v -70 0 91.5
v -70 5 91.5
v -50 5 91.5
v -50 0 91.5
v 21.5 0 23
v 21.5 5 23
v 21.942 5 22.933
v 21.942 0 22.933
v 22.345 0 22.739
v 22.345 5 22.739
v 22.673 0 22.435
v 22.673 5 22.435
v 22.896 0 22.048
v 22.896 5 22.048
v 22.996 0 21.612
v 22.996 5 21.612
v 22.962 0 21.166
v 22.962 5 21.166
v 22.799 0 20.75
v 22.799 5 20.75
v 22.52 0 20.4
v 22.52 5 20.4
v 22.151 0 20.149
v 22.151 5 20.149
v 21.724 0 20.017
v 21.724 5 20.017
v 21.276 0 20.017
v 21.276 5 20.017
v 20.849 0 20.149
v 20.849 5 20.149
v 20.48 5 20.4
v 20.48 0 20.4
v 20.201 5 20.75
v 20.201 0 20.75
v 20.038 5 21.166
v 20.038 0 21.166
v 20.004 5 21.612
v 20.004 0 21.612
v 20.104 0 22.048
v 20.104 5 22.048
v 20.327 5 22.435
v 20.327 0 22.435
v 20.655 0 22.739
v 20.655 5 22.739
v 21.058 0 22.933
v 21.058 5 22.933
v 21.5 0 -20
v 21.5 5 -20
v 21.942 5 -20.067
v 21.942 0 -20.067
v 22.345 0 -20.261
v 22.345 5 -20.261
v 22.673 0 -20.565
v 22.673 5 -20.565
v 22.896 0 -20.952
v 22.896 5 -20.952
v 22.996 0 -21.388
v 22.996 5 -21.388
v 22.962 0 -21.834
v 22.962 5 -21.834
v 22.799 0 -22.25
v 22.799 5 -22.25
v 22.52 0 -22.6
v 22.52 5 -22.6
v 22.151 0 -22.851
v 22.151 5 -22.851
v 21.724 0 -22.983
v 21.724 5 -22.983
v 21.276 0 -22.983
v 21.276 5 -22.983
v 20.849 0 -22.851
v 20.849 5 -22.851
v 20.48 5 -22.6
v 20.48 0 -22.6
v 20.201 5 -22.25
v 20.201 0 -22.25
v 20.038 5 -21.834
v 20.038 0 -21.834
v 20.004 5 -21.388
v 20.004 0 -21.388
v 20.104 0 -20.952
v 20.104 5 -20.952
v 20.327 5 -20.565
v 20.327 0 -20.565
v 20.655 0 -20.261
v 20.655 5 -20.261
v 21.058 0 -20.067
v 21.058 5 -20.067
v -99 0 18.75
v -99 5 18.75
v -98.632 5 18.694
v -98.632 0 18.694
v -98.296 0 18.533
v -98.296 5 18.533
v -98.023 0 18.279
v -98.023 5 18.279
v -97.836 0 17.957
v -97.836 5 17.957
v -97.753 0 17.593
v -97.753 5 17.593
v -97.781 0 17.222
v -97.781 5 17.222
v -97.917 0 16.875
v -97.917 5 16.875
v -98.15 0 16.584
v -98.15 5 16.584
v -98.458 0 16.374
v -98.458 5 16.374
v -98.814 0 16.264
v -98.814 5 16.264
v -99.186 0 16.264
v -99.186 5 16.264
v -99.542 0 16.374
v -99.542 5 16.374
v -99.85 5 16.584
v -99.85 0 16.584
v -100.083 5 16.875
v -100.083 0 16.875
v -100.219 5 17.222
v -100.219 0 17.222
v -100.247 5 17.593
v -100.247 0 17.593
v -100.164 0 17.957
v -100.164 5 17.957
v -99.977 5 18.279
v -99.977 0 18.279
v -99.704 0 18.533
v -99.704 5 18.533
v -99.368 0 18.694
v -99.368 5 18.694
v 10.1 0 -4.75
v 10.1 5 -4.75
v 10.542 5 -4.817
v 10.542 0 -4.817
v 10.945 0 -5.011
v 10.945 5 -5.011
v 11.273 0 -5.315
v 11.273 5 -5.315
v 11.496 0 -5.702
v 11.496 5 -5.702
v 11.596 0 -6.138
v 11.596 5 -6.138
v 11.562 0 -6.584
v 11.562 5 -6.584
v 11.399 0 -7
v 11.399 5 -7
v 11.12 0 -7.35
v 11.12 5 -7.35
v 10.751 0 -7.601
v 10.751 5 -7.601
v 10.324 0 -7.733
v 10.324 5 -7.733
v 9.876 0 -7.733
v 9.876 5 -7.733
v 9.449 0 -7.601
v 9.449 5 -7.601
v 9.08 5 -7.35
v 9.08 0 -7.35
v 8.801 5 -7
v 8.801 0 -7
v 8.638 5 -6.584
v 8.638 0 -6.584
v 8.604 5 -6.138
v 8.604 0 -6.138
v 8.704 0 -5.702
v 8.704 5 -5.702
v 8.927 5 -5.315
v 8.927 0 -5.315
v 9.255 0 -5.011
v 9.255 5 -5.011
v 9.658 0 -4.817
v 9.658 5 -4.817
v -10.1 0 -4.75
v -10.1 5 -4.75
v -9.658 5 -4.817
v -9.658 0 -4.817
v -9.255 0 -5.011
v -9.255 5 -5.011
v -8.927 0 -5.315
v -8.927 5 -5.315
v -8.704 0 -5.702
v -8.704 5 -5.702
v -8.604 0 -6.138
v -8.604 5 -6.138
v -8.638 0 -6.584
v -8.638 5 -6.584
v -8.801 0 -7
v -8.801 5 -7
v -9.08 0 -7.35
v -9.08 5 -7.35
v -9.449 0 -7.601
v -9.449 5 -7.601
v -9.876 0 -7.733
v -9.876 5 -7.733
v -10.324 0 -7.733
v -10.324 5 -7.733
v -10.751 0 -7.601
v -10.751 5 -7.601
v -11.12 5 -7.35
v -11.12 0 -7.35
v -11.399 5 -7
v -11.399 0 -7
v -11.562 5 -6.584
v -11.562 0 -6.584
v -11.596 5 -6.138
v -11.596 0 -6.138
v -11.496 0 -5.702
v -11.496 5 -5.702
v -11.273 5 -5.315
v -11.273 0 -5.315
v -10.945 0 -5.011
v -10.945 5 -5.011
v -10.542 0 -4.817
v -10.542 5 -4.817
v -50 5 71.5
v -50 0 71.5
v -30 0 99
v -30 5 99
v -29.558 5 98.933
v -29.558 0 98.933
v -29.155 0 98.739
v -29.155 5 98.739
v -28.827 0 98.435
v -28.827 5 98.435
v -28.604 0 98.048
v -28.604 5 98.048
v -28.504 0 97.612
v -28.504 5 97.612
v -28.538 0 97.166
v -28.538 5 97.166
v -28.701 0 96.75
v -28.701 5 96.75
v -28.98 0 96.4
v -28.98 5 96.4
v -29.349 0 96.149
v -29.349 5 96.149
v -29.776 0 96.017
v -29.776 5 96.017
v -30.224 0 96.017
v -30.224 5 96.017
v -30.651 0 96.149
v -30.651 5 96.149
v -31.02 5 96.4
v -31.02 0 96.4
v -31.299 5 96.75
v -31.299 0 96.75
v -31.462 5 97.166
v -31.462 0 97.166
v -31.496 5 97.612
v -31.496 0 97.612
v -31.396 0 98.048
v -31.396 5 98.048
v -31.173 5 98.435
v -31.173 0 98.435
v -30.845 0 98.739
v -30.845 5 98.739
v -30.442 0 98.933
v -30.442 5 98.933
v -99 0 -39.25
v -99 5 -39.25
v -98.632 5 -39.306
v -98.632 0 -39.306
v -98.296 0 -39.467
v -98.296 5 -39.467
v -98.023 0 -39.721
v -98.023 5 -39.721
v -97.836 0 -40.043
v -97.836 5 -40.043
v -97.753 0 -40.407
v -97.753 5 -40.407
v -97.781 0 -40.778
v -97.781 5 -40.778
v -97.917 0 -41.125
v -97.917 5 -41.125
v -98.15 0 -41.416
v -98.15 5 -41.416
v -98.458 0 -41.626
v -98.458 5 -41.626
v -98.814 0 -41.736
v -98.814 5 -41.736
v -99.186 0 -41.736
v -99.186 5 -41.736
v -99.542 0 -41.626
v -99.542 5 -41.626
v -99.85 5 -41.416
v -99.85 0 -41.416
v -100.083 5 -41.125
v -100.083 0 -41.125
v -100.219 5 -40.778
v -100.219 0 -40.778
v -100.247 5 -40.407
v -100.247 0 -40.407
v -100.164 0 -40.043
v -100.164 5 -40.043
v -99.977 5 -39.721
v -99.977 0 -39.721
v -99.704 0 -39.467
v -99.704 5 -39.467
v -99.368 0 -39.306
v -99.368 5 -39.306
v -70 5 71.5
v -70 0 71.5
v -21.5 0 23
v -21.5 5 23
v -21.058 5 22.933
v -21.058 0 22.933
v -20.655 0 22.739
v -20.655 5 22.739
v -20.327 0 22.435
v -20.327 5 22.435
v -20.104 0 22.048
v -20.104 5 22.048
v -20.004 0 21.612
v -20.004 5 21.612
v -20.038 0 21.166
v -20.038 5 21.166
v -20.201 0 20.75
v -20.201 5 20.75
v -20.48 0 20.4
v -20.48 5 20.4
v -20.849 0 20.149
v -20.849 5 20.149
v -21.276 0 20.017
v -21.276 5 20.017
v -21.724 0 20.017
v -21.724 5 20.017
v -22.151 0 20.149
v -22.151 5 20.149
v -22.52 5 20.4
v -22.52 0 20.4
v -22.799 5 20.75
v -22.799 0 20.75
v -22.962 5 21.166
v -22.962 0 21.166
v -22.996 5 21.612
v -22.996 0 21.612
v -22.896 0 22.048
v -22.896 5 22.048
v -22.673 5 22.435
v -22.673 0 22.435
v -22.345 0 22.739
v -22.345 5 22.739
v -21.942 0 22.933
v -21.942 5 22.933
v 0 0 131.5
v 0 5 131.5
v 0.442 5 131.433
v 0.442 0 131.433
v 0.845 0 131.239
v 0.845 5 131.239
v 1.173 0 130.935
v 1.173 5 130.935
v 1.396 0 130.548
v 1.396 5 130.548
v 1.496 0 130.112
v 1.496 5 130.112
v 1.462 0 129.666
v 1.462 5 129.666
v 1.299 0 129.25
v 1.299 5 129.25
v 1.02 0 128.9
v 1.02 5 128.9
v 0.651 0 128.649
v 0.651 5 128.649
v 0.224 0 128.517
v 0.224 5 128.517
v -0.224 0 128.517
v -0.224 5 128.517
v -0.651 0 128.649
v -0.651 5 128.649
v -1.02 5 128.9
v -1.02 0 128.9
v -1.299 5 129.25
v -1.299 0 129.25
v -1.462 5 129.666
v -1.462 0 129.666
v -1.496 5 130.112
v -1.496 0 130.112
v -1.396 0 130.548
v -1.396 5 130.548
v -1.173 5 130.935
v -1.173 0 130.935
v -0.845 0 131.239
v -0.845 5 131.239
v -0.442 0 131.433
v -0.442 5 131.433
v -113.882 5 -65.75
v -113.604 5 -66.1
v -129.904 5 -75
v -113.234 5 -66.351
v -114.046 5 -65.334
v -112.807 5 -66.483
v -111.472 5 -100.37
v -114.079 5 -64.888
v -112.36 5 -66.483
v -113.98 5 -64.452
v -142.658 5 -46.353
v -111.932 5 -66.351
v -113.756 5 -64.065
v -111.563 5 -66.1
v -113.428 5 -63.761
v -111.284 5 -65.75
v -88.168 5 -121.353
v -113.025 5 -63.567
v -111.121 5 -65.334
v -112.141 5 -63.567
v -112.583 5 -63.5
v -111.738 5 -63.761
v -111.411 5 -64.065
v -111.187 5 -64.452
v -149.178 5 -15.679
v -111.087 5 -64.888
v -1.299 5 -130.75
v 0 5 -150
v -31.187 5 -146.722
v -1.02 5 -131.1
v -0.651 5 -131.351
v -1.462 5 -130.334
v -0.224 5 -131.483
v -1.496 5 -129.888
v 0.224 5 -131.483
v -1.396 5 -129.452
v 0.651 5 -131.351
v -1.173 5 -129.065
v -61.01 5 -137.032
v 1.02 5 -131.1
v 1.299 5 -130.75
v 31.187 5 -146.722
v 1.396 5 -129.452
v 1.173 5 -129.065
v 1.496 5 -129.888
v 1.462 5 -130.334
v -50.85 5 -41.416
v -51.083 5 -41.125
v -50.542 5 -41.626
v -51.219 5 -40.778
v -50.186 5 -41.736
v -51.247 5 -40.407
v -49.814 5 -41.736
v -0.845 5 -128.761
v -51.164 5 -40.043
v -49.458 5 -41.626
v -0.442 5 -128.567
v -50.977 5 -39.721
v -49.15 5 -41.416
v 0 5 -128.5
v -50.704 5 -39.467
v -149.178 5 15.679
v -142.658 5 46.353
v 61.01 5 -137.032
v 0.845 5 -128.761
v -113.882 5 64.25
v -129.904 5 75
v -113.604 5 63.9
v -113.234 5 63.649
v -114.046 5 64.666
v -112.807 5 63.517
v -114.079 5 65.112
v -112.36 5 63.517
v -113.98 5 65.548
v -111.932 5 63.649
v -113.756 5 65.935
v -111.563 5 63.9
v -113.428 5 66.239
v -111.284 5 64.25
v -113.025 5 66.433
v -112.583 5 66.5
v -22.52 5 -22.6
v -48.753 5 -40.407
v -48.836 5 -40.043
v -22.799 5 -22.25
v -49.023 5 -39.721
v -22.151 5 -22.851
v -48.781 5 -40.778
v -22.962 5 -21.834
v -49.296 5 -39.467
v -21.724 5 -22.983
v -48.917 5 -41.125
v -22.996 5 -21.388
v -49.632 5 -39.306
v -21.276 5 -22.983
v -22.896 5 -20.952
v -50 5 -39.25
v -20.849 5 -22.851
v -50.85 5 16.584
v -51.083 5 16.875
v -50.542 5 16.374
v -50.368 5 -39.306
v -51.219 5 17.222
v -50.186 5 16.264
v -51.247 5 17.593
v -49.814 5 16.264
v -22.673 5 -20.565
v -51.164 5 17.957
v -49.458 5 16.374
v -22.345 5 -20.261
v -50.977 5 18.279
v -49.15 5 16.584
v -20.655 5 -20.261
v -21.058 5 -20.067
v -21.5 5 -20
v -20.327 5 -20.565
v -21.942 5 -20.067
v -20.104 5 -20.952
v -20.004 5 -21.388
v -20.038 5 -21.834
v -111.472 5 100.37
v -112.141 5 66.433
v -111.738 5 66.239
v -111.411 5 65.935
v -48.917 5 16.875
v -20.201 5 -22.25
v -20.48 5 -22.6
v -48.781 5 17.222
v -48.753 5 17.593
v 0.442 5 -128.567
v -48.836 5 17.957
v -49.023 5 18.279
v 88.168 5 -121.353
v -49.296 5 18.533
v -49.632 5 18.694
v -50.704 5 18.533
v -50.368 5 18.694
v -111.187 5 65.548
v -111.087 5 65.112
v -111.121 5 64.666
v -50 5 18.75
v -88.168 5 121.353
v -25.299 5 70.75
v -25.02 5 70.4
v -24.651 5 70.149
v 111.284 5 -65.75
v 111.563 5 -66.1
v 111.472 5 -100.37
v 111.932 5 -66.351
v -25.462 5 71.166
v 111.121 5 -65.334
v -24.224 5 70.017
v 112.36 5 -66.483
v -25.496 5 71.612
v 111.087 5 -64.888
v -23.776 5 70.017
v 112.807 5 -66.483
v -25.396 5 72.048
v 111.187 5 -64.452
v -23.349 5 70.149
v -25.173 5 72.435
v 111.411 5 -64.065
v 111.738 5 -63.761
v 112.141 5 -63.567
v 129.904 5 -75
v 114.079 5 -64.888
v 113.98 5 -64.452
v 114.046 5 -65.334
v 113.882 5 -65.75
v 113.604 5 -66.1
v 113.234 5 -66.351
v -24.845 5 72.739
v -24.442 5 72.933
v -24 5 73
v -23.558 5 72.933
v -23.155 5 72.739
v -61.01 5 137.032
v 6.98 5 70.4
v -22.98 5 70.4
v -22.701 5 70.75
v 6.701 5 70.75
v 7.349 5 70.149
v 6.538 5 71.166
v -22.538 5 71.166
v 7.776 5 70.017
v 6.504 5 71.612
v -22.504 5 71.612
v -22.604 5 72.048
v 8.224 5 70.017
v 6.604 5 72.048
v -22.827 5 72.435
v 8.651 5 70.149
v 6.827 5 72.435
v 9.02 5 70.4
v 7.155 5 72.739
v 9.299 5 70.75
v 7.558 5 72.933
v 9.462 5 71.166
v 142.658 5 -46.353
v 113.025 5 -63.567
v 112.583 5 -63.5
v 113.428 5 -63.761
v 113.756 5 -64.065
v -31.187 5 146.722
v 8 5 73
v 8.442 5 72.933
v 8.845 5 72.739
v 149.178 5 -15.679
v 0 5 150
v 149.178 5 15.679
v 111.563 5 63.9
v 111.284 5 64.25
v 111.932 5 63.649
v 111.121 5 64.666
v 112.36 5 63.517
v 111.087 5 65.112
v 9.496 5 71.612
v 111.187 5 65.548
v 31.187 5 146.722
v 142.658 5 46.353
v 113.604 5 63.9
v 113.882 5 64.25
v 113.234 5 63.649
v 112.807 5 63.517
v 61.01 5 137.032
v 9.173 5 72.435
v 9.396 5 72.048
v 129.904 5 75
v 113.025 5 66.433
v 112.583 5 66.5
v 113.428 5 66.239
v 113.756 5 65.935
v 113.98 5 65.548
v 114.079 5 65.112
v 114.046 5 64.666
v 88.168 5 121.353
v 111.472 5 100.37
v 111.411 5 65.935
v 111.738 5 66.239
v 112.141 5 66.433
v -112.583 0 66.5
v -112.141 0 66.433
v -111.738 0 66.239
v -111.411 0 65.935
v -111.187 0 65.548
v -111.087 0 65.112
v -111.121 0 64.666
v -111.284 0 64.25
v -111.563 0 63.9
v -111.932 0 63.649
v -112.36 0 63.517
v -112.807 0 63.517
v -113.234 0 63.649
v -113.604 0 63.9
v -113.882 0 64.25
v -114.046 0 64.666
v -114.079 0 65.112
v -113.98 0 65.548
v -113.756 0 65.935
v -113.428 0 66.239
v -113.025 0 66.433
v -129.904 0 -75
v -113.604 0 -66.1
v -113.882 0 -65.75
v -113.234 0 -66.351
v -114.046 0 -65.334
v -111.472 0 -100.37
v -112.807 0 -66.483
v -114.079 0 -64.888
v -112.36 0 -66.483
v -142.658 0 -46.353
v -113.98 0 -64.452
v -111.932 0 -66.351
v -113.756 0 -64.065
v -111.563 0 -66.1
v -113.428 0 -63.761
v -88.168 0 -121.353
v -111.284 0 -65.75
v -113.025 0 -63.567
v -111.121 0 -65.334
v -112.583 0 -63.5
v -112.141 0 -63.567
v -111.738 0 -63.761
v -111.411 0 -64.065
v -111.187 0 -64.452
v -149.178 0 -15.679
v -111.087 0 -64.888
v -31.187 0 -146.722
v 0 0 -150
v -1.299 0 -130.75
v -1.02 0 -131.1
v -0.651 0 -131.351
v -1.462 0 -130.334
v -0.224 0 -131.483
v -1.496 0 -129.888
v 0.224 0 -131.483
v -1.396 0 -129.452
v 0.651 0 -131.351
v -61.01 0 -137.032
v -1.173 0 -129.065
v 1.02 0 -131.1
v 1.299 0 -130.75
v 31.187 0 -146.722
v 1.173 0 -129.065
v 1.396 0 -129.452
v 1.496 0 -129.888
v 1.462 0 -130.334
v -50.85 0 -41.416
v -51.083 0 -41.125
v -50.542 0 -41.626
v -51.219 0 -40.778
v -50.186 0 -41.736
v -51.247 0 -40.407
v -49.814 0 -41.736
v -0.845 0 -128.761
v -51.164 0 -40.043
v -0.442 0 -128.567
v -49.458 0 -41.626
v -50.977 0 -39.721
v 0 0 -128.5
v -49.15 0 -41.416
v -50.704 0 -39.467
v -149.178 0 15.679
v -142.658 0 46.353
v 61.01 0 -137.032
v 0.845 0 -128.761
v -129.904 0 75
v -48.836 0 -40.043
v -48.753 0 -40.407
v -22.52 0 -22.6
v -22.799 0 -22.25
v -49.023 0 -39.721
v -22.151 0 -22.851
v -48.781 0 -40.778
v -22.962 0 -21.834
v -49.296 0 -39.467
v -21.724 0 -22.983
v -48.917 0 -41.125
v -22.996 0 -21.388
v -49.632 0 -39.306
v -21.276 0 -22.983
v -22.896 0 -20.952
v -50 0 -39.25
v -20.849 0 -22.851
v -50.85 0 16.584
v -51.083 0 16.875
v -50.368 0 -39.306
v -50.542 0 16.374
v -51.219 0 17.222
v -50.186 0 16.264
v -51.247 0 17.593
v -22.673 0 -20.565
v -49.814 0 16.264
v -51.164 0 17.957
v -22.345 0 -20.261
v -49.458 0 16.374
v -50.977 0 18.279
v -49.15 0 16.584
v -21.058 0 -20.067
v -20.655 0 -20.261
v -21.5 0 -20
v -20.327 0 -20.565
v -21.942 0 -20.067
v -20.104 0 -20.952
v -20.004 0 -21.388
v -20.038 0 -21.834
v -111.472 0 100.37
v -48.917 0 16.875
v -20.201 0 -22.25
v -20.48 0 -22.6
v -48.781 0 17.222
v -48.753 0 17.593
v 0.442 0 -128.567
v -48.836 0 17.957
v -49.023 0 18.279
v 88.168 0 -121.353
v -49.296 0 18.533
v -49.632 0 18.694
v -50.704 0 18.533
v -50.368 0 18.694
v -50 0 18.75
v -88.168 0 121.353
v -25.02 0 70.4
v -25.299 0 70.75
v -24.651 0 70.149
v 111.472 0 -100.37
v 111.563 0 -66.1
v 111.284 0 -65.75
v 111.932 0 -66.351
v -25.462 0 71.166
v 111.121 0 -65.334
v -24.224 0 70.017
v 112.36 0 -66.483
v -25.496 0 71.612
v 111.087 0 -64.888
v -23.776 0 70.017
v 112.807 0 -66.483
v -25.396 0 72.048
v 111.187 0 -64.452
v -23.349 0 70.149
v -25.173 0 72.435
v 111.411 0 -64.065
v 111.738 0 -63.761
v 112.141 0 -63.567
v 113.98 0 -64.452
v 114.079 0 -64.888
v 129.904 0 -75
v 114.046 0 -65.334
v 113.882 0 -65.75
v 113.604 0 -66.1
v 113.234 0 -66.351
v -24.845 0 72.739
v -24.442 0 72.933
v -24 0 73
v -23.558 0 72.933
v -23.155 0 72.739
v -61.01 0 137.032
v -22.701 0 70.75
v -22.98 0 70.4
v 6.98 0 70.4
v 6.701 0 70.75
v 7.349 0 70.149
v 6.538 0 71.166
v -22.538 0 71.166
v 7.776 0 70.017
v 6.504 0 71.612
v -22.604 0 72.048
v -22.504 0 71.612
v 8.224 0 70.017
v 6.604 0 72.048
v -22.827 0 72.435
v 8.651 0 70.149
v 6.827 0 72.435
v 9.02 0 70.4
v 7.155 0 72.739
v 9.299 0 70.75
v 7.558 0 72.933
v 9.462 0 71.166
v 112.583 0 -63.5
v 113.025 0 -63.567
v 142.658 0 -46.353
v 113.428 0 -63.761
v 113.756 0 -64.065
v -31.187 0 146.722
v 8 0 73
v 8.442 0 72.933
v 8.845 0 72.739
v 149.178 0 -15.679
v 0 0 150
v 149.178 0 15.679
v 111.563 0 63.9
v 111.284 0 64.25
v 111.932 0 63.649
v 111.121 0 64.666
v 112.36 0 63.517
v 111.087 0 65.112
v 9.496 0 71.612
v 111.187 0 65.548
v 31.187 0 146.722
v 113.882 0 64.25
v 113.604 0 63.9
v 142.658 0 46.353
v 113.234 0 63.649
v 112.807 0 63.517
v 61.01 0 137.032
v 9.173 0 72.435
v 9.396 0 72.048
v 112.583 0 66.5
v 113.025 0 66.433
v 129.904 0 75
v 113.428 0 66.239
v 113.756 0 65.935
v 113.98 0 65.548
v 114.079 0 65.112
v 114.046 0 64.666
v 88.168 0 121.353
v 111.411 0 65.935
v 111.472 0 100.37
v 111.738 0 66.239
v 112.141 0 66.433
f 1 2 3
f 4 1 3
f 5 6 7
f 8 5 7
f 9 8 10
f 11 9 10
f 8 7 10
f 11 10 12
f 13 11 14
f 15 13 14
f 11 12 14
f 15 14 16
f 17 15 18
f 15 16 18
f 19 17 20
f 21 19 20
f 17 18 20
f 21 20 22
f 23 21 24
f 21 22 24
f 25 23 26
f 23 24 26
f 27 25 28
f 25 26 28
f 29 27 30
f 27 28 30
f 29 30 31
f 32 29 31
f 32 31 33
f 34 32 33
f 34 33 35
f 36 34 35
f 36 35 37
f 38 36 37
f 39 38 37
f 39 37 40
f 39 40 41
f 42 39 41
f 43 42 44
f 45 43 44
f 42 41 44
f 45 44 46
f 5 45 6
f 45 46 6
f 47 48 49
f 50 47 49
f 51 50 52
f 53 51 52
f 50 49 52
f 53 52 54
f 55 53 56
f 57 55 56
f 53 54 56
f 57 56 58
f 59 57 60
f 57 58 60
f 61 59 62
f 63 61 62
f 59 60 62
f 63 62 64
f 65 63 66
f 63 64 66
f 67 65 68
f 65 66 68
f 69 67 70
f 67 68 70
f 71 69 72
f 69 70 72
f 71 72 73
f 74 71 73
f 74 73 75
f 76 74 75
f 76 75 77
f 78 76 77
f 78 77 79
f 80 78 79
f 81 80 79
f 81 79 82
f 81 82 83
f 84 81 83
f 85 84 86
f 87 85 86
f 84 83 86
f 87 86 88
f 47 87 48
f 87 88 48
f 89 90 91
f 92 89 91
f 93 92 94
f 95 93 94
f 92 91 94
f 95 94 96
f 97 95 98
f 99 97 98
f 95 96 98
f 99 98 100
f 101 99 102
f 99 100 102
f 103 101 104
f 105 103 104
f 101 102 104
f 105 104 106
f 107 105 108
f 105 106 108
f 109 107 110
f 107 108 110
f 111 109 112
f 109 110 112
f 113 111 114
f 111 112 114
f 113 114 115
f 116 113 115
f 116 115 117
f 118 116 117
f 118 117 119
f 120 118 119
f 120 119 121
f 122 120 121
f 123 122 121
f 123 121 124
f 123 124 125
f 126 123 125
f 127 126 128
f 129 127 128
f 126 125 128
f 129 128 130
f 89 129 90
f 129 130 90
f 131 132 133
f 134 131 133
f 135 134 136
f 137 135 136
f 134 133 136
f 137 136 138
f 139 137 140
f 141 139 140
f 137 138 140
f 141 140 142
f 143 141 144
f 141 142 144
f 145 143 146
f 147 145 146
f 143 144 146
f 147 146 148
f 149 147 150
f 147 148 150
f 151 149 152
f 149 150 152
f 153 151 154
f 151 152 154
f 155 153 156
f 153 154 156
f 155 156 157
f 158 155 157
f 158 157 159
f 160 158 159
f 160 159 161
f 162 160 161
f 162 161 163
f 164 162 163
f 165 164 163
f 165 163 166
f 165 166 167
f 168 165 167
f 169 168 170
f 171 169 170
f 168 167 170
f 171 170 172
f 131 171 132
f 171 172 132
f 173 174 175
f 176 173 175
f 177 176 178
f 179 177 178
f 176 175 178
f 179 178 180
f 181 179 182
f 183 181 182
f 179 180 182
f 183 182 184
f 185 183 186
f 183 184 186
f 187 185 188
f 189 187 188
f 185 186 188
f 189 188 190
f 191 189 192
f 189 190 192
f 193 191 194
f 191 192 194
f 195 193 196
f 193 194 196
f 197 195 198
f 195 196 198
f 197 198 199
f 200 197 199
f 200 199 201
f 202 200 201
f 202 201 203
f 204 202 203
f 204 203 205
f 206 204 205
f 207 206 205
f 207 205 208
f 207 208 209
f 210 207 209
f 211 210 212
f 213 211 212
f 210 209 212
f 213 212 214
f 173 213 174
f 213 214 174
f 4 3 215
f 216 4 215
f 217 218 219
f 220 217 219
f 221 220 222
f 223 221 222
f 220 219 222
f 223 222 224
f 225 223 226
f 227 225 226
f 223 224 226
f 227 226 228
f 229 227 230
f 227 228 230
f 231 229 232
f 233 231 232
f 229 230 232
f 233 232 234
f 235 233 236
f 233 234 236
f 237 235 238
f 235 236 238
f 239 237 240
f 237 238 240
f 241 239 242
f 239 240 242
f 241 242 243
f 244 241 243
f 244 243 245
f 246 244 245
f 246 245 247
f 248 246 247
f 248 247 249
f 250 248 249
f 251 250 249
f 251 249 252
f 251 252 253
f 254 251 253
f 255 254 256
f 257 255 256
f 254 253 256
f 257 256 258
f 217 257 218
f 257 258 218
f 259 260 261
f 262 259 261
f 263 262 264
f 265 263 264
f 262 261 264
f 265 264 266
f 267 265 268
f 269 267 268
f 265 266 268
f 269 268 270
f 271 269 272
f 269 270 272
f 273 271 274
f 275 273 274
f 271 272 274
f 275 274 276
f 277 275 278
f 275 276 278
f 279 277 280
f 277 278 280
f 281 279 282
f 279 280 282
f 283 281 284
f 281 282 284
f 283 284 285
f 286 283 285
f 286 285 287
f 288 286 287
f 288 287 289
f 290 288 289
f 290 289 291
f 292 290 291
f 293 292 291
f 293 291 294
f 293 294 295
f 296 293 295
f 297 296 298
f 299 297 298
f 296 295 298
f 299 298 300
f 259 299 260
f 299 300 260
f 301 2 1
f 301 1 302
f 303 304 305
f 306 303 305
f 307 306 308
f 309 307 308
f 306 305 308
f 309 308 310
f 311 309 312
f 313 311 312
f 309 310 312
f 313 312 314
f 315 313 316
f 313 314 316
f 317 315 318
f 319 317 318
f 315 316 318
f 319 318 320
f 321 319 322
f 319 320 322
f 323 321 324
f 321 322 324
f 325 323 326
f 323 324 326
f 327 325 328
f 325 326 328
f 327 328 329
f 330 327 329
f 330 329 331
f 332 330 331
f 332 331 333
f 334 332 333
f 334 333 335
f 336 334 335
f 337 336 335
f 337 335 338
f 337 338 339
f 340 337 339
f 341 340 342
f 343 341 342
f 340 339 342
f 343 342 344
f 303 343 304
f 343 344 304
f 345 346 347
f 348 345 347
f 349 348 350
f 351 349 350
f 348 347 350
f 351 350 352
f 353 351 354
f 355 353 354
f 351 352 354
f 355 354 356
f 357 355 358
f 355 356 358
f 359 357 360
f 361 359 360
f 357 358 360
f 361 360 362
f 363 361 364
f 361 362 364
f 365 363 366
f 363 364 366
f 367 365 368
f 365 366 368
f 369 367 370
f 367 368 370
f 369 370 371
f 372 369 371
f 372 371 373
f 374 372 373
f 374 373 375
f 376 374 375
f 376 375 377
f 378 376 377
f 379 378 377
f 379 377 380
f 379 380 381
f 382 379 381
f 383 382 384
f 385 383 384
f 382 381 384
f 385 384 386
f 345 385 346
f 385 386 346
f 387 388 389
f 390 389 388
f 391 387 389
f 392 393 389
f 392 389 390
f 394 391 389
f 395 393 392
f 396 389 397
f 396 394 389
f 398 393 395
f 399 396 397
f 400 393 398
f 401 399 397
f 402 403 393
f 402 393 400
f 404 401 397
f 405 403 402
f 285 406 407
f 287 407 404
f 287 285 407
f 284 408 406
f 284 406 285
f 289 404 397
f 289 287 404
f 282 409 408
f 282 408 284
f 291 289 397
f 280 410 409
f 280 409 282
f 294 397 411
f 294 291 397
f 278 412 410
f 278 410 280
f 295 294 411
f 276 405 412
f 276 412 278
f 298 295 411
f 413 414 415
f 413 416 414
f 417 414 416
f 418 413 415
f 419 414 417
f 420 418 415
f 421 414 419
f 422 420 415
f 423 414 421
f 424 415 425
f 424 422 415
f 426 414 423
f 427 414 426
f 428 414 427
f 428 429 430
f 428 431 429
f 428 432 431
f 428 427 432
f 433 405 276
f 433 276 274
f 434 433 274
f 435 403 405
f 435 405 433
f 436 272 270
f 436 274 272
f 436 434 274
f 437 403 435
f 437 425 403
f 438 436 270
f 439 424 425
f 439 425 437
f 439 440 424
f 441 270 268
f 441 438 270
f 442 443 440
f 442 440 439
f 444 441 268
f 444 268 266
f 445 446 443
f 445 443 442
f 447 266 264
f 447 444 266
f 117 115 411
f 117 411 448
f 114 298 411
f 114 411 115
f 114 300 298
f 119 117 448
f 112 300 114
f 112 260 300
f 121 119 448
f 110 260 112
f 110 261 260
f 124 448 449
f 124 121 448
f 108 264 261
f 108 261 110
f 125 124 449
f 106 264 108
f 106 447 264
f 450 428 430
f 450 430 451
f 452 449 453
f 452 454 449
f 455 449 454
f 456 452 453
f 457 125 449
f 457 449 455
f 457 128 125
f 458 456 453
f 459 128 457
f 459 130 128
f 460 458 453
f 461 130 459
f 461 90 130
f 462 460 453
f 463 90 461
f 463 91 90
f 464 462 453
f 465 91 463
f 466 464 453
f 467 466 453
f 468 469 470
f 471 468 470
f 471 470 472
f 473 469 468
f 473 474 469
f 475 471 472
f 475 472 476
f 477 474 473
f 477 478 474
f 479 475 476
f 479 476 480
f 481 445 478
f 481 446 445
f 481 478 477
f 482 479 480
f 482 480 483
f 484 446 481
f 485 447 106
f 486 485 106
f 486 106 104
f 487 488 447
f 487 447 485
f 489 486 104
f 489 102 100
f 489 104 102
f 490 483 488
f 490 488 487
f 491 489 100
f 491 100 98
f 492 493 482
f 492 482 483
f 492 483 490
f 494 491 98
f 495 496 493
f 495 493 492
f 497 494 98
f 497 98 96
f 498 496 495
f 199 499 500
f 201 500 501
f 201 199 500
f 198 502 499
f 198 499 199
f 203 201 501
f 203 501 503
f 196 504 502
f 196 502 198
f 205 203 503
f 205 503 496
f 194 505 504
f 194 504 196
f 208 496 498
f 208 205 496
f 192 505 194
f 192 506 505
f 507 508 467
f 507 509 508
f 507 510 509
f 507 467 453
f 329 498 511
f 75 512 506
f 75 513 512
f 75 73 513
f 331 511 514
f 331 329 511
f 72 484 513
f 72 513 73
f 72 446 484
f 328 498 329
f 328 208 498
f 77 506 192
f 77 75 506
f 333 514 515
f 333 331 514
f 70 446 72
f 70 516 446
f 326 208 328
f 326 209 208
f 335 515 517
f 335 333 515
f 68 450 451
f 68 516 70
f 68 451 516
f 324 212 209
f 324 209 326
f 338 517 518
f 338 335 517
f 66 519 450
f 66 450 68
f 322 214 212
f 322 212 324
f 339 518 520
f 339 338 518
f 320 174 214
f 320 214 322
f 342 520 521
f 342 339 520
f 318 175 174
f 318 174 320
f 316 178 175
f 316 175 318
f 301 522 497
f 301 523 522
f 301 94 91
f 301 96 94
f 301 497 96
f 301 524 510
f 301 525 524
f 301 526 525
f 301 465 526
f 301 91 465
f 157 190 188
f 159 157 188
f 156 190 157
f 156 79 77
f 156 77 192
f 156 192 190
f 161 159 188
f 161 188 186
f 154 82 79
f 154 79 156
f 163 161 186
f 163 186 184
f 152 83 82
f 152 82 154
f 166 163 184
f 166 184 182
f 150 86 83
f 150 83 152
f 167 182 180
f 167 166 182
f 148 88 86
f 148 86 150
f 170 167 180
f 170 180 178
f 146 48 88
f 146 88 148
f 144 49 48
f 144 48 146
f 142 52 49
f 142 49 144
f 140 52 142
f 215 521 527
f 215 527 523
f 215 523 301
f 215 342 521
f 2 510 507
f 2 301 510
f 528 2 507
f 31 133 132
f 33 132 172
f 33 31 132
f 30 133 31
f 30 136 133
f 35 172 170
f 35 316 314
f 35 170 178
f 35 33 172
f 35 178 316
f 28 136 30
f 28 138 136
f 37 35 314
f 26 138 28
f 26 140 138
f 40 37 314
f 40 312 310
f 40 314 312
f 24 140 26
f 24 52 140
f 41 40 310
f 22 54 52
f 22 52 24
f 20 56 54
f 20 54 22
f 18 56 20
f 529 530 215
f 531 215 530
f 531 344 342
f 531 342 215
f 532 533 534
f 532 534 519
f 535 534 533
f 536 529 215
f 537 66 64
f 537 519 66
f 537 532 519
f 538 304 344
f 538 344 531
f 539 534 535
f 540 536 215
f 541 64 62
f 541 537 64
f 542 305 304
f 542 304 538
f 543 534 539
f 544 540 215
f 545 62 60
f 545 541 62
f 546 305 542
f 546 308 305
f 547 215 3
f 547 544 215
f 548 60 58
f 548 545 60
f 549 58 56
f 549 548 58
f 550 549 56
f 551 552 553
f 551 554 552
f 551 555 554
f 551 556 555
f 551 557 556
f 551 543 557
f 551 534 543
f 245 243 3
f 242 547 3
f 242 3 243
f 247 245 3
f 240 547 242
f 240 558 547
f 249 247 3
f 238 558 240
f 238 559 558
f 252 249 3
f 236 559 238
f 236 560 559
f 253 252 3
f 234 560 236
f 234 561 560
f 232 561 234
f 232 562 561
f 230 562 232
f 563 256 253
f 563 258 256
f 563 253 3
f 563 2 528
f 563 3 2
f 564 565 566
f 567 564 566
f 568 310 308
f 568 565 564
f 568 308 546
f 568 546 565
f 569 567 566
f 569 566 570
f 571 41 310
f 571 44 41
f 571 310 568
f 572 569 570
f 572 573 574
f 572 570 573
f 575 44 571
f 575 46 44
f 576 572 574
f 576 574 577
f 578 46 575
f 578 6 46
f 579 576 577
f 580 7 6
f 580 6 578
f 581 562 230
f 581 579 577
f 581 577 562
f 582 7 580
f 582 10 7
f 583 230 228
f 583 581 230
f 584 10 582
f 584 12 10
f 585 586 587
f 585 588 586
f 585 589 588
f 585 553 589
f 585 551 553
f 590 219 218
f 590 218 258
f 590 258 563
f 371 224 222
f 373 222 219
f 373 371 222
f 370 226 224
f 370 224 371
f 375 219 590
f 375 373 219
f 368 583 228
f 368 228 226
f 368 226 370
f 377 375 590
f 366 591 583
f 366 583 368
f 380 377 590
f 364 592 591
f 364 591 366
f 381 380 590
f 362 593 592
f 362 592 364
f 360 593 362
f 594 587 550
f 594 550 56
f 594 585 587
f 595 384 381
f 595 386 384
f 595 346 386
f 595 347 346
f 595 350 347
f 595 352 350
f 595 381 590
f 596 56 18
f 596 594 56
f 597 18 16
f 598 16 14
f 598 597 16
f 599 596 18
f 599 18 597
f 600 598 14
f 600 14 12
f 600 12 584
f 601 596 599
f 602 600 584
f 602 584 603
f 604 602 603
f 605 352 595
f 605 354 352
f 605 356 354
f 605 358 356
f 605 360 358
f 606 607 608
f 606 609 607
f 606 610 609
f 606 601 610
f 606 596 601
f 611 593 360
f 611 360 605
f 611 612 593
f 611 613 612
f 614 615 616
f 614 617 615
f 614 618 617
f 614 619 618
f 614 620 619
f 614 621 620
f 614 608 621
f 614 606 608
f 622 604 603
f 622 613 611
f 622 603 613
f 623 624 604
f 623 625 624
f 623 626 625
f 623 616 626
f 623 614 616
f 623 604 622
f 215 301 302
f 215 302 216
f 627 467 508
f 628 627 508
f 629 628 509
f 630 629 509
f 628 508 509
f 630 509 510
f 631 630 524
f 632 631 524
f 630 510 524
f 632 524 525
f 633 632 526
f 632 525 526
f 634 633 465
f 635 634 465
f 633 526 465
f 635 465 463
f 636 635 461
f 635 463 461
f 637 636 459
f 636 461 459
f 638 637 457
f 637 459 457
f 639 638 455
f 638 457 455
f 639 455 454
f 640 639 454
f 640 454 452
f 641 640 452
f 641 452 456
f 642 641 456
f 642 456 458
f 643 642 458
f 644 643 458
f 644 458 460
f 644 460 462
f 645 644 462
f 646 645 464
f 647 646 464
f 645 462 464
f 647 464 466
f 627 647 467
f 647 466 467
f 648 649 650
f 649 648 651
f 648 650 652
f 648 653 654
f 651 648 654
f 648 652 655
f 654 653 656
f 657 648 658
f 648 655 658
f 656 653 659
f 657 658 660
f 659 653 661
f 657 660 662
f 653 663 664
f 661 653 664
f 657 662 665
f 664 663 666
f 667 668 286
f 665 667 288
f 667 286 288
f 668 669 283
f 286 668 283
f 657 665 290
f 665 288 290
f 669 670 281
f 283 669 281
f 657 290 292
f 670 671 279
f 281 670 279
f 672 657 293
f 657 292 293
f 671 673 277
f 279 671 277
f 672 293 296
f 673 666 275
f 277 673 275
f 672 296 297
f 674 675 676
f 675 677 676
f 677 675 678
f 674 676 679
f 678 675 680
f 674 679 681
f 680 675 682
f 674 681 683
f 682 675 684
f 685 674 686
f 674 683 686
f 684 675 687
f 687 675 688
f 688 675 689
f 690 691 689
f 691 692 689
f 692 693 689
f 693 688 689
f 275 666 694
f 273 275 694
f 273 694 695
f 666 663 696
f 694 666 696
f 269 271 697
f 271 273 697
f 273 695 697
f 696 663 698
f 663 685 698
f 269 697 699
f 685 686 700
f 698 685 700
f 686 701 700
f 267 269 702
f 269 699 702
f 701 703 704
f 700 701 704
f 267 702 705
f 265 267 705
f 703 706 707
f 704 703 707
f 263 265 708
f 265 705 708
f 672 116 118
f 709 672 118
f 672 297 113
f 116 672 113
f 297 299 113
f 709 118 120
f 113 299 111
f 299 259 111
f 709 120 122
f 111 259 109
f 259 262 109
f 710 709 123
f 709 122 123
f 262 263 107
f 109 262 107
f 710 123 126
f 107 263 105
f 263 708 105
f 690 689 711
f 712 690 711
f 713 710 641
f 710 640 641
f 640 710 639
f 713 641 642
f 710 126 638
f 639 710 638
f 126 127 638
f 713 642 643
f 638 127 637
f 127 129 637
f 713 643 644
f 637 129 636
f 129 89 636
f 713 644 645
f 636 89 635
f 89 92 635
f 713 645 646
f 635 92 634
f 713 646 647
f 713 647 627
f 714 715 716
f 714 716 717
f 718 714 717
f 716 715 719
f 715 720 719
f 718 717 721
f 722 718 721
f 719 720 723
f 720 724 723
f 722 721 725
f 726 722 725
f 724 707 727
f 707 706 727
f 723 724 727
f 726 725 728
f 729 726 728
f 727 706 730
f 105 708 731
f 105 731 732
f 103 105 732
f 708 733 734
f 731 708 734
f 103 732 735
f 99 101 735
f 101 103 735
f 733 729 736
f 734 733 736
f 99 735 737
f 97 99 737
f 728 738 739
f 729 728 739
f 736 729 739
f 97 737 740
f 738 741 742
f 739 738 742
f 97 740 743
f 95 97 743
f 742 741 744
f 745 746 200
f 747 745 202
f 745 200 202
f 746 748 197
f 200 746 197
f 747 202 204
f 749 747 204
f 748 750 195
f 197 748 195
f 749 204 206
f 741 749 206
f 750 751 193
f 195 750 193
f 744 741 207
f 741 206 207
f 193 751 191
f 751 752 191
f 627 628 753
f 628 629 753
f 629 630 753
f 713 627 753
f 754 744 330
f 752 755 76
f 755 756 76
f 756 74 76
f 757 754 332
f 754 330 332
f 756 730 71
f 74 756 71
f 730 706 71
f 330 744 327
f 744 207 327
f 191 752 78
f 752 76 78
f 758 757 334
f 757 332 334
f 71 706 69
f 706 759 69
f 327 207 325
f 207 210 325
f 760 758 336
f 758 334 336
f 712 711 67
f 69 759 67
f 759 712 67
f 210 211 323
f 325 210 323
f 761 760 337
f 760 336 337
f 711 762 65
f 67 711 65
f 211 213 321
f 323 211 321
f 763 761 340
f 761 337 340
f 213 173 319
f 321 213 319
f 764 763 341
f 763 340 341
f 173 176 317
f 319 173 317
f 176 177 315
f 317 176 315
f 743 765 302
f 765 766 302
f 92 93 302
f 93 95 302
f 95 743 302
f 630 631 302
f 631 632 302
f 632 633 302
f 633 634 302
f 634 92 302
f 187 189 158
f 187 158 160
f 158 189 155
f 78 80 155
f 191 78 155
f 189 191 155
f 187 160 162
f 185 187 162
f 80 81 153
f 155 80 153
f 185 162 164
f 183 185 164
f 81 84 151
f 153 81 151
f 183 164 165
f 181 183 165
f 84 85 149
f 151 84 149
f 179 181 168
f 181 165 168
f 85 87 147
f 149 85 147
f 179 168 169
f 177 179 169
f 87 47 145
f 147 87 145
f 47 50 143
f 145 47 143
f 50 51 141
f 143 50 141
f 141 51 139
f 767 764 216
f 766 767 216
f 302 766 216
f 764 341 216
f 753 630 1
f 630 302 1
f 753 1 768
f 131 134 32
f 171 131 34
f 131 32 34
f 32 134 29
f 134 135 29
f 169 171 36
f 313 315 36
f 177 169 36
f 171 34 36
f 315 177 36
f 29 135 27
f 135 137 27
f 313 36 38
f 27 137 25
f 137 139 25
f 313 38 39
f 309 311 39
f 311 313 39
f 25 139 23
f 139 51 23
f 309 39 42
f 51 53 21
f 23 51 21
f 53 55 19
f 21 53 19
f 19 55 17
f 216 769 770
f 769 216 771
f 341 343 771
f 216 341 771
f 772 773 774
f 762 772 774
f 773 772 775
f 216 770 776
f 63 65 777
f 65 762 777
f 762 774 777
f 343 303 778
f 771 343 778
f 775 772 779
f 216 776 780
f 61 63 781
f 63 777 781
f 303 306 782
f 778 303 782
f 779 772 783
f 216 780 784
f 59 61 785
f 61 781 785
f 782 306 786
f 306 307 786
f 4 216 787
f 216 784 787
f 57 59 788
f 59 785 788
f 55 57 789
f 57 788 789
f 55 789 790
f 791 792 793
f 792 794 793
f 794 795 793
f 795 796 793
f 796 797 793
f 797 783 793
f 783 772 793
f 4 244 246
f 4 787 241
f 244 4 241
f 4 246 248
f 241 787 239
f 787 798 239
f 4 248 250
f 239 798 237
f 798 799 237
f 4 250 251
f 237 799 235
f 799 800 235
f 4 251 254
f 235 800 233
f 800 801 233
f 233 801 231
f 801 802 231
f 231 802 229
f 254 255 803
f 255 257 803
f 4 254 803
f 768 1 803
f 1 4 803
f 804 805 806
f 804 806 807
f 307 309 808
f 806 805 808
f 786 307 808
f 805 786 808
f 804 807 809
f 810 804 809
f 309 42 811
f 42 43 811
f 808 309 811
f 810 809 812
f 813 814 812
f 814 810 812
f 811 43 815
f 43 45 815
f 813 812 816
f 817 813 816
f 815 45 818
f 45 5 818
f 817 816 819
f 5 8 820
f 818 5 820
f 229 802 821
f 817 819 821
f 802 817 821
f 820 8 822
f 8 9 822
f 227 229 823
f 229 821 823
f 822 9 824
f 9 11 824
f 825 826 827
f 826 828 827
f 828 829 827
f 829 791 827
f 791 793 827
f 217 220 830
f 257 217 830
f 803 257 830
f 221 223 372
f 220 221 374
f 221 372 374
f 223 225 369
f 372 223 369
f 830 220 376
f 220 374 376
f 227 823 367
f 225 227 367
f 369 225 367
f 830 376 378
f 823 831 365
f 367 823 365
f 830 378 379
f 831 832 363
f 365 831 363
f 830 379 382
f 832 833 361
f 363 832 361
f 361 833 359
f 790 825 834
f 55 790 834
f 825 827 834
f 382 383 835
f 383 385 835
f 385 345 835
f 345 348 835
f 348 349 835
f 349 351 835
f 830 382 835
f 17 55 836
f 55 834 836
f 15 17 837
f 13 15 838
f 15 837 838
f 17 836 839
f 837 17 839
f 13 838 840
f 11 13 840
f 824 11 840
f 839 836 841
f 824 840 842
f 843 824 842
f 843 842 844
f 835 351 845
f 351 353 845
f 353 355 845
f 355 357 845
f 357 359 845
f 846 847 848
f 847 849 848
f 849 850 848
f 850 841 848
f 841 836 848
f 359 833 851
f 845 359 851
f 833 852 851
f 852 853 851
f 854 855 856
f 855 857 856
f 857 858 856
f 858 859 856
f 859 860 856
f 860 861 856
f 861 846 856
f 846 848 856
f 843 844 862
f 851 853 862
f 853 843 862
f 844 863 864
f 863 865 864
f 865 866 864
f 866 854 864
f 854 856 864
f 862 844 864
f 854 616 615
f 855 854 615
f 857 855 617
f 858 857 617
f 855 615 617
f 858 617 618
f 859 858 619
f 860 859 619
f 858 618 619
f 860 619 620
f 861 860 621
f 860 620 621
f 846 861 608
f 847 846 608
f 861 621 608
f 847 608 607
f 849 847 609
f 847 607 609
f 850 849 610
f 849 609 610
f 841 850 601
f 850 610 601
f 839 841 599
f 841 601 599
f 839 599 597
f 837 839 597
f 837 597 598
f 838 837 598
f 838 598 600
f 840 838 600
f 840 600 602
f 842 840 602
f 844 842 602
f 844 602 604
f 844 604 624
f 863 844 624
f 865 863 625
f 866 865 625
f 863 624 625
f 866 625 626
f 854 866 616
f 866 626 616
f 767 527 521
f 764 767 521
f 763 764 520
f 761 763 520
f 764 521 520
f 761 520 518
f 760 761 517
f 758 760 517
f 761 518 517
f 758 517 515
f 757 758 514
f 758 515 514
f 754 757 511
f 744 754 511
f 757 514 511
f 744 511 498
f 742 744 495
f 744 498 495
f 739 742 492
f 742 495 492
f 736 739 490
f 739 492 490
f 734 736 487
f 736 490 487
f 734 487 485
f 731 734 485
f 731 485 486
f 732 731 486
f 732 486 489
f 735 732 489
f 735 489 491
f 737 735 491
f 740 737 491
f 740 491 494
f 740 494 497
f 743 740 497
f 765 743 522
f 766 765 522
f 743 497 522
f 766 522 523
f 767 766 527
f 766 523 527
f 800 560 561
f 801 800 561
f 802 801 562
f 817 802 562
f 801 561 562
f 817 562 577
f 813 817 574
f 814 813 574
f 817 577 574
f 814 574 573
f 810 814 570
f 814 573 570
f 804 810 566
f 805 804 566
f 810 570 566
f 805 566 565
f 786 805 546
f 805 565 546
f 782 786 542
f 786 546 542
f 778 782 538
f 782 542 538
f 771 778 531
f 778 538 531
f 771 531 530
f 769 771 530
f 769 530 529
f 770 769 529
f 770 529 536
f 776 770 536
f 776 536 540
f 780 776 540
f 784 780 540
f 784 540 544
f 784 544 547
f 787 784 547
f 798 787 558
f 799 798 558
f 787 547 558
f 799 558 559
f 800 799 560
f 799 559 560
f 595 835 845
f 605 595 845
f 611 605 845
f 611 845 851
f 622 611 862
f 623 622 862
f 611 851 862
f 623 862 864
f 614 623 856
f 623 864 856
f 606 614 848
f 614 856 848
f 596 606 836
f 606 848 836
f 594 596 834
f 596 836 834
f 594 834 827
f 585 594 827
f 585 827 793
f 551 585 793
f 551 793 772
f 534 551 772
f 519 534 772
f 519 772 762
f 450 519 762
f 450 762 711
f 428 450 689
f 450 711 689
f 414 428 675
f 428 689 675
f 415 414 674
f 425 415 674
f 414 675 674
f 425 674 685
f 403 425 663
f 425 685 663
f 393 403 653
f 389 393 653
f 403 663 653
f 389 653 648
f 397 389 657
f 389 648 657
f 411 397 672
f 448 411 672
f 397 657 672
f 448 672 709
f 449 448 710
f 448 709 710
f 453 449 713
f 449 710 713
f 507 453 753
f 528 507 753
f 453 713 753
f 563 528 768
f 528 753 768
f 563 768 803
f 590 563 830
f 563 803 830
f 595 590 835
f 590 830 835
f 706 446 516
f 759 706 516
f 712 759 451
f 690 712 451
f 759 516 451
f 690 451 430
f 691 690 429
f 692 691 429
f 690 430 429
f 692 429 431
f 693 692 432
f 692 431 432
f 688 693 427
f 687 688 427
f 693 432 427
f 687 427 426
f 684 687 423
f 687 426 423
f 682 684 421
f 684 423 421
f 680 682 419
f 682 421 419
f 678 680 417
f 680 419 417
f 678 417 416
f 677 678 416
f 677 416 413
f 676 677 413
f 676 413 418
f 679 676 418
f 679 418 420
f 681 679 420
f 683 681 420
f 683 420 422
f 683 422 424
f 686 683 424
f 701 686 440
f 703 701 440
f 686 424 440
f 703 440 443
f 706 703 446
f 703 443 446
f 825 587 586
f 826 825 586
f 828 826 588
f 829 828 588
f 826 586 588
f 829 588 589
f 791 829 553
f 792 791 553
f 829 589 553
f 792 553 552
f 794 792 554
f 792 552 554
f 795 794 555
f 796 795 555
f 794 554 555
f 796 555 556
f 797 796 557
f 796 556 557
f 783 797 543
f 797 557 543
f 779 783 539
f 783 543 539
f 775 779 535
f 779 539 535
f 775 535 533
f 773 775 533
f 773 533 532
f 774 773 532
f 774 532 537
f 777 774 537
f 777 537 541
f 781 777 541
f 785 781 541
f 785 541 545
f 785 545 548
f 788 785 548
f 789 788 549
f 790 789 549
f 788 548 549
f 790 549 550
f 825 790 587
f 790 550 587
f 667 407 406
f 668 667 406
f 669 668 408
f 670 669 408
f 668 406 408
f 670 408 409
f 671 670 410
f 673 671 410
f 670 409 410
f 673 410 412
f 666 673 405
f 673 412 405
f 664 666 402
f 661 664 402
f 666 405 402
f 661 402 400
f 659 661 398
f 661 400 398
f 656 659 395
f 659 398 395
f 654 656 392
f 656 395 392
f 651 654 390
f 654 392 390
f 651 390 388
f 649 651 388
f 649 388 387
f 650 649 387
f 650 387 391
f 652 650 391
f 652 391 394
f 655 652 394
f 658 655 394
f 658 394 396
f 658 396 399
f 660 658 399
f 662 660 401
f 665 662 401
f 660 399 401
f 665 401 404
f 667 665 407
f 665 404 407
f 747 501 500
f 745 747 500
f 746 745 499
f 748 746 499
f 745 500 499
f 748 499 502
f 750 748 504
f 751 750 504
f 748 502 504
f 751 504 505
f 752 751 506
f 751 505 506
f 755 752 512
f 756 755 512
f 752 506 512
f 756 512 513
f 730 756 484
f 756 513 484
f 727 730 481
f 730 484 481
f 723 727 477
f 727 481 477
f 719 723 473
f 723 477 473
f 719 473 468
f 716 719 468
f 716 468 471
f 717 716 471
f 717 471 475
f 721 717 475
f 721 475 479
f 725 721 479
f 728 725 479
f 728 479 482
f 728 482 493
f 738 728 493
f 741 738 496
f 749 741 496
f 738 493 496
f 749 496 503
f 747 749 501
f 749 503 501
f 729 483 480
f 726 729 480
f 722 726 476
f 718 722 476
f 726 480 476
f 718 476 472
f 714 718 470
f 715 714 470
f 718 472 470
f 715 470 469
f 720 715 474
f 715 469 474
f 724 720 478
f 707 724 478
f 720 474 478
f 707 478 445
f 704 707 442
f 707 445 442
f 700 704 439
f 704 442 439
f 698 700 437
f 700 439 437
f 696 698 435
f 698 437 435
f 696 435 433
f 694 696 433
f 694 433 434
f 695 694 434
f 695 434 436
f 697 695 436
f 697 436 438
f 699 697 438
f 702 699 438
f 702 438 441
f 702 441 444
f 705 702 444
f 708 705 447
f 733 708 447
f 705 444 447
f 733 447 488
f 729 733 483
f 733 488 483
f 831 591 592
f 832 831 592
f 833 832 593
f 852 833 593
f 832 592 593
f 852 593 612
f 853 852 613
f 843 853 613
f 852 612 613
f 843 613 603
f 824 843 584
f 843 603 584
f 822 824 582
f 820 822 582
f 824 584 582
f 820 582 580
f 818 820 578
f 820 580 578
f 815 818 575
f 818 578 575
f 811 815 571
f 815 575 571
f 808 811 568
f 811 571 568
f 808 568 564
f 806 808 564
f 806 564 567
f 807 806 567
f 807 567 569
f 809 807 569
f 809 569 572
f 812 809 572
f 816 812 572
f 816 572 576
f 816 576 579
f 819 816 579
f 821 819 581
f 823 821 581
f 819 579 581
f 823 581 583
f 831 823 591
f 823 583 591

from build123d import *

# Parameters (mm, degrees)
SKETCH1_R           = 150
BOSS_EXTRUDE1_DEPTH = 5
SKETCH2_R           = 1.5
CUT_EXTRUDE1_DEPTH  = 5
SKETCH3_R           = 1.5
CUT_EXTRUDE2_DEPTH  = 5
SKETCH4_R           = 1.5
CUT_EXTRUDE3_DEPTH  = 5
SKETCH5_R           = 1.5
SKETCH5_W           = 20
SKETCH5_H           = 20
CUT_EXTRUDE4_DEPTH  = 5
SKETCH6_R           = 1.25
CUT_EXTRUDE5_DEPTH  = 5


with BuildPart() as part:
    # Sketch1 → Boss-Extrude1 (new body)
    with BuildSketch(Plane(origin=(0, 0, 0), x_dir=(1, 0, 0), z_dir=(0, 1, 0))):
        with Locations(Location((0, 0, 0), (0, 0, 270))):
            Circle(SKETCH1_R)
    extrude(amount=BOSS_EXTRUDE1_DEPTH)

    # Sketch2 → Cut-Extrude1 (cut)
    with BuildSketch(Plane(origin=(0, 5, 0), x_dir=(1, 0, 0), z_dir=(0, 1, 0))):
        with Locations(Location((0, 130, 0), (0, 0, 270))):
            Circle(SKETCH2_R)
        with Locations(Location((112.583302492, 65, 0), (0, 0, 270))):
            Circle(SKETCH2_R)
        with Locations(Location((112.583302492, -65, 0), (0, 0, 270))):
            Circle(SKETCH2_R)
        with Locations(Location((0, -130, 0), (0, 0, 270))):
            Circle(SKETCH2_R)
        with Locations(Location((-112.583302492, -65, 0), (0, 0, 270))):
            Circle(SKETCH2_R)
        with Locations(Location((-112.583302492, 65, 0), (0, 0, 270))):
            Circle(SKETCH2_R)
    extrude(amount=-CUT_EXTRUDE1_DEPTH, mode=Mode.SUBTRACT)

    # Sketch3 → Cut-Extrude2 (cut)
    with BuildSketch(Plane(origin=(0, 5, 0), x_dir=(1, 0, 0), z_dir=(0, 1, 0))):
        with Locations(Location((-10.1, 6.25, 0), (0, 0, 270))):
            Circle(SKETCH3_R)
        with Locations(Location((10.1, 6.25, 0), (0, 0, 270))):
            Circle(SKETCH3_R)
    extrude(amount=-CUT_EXTRUDE2_DEPTH, mode=Mode.SUBTRACT)

    # Sketch4 → Cut-Extrude3 (cut)
    with BuildSketch(Plane(origin=(0, 5, 0), x_dir=(1, 0, 0), z_dir=(0, 1, 0))):
        with Locations(Location((-21.5, 21.5, 0), (0, 0, 270))):
            Circle(SKETCH4_R)
        with Locations(Location((21.5, 21.5, 0), (0, 0, 270))):
            Circle(SKETCH4_R)
        with Locations(Location((-21.5, -21.5, 0), (0, 0, 270))):
            Circle(SKETCH4_R)
        with Locations(Location((21.5, -21.5, 0), (0, 0, 270))):
            Circle(SKETCH4_R)
    extrude(amount=-CUT_EXTRUDE3_DEPTH, mode=Mode.SUBTRACT)

    # Sketch5 → Cut-Extrude4 (cut)
    with BuildSketch(Plane(origin=(0, 5, 0), x_dir=(1, 0, 0), z_dir=(0, 1, 0))):
        with Locations(Location((-30, -97.5, 0), (0, 0, 270))):
            Circle(SKETCH5_R)
        with Locations(Location((-24, -71.5, 0), (0, 0, 270))):
            Circle(SKETCH5_R)
        with Locations(Location((8, -71.5, 0), (0, 0, 270))):
            Circle(SKETCH5_R)
        with Locations((-60, -81.5)):
            Rectangle(SKETCH5_W, SKETCH5_H)
    extrude(amount=-CUT_EXTRUDE4_DEPTH, mode=Mode.SUBTRACT)

    # Sketch6 → Cut-Extrude5 (cut)
    with BuildSketch(Plane(origin=(0, 5, 0), x_dir=(1, 0, 0), z_dir=(0, 1, 0))):
        with Locations(Location((-50, 40.5, 0), (0, 0, 270))):
            Circle(SKETCH6_R)
        with Locations(Location((-99, 40.5, 0), (0, 0, 270))):
            Circle(SKETCH6_R)
        with Locations(Location((-99, -17.5, 0), (0, 0, 270))):
            Circle(SKETCH6_R)
        with Locations(Location((-50, -17.5, 0), (0, 0, 270))):
            Circle(SKETCH6_R)
    extrude(amount=-CUT_EXTRUDE5_DEPTH, mode=Mode.SUBTRACT)


solid = part.part
